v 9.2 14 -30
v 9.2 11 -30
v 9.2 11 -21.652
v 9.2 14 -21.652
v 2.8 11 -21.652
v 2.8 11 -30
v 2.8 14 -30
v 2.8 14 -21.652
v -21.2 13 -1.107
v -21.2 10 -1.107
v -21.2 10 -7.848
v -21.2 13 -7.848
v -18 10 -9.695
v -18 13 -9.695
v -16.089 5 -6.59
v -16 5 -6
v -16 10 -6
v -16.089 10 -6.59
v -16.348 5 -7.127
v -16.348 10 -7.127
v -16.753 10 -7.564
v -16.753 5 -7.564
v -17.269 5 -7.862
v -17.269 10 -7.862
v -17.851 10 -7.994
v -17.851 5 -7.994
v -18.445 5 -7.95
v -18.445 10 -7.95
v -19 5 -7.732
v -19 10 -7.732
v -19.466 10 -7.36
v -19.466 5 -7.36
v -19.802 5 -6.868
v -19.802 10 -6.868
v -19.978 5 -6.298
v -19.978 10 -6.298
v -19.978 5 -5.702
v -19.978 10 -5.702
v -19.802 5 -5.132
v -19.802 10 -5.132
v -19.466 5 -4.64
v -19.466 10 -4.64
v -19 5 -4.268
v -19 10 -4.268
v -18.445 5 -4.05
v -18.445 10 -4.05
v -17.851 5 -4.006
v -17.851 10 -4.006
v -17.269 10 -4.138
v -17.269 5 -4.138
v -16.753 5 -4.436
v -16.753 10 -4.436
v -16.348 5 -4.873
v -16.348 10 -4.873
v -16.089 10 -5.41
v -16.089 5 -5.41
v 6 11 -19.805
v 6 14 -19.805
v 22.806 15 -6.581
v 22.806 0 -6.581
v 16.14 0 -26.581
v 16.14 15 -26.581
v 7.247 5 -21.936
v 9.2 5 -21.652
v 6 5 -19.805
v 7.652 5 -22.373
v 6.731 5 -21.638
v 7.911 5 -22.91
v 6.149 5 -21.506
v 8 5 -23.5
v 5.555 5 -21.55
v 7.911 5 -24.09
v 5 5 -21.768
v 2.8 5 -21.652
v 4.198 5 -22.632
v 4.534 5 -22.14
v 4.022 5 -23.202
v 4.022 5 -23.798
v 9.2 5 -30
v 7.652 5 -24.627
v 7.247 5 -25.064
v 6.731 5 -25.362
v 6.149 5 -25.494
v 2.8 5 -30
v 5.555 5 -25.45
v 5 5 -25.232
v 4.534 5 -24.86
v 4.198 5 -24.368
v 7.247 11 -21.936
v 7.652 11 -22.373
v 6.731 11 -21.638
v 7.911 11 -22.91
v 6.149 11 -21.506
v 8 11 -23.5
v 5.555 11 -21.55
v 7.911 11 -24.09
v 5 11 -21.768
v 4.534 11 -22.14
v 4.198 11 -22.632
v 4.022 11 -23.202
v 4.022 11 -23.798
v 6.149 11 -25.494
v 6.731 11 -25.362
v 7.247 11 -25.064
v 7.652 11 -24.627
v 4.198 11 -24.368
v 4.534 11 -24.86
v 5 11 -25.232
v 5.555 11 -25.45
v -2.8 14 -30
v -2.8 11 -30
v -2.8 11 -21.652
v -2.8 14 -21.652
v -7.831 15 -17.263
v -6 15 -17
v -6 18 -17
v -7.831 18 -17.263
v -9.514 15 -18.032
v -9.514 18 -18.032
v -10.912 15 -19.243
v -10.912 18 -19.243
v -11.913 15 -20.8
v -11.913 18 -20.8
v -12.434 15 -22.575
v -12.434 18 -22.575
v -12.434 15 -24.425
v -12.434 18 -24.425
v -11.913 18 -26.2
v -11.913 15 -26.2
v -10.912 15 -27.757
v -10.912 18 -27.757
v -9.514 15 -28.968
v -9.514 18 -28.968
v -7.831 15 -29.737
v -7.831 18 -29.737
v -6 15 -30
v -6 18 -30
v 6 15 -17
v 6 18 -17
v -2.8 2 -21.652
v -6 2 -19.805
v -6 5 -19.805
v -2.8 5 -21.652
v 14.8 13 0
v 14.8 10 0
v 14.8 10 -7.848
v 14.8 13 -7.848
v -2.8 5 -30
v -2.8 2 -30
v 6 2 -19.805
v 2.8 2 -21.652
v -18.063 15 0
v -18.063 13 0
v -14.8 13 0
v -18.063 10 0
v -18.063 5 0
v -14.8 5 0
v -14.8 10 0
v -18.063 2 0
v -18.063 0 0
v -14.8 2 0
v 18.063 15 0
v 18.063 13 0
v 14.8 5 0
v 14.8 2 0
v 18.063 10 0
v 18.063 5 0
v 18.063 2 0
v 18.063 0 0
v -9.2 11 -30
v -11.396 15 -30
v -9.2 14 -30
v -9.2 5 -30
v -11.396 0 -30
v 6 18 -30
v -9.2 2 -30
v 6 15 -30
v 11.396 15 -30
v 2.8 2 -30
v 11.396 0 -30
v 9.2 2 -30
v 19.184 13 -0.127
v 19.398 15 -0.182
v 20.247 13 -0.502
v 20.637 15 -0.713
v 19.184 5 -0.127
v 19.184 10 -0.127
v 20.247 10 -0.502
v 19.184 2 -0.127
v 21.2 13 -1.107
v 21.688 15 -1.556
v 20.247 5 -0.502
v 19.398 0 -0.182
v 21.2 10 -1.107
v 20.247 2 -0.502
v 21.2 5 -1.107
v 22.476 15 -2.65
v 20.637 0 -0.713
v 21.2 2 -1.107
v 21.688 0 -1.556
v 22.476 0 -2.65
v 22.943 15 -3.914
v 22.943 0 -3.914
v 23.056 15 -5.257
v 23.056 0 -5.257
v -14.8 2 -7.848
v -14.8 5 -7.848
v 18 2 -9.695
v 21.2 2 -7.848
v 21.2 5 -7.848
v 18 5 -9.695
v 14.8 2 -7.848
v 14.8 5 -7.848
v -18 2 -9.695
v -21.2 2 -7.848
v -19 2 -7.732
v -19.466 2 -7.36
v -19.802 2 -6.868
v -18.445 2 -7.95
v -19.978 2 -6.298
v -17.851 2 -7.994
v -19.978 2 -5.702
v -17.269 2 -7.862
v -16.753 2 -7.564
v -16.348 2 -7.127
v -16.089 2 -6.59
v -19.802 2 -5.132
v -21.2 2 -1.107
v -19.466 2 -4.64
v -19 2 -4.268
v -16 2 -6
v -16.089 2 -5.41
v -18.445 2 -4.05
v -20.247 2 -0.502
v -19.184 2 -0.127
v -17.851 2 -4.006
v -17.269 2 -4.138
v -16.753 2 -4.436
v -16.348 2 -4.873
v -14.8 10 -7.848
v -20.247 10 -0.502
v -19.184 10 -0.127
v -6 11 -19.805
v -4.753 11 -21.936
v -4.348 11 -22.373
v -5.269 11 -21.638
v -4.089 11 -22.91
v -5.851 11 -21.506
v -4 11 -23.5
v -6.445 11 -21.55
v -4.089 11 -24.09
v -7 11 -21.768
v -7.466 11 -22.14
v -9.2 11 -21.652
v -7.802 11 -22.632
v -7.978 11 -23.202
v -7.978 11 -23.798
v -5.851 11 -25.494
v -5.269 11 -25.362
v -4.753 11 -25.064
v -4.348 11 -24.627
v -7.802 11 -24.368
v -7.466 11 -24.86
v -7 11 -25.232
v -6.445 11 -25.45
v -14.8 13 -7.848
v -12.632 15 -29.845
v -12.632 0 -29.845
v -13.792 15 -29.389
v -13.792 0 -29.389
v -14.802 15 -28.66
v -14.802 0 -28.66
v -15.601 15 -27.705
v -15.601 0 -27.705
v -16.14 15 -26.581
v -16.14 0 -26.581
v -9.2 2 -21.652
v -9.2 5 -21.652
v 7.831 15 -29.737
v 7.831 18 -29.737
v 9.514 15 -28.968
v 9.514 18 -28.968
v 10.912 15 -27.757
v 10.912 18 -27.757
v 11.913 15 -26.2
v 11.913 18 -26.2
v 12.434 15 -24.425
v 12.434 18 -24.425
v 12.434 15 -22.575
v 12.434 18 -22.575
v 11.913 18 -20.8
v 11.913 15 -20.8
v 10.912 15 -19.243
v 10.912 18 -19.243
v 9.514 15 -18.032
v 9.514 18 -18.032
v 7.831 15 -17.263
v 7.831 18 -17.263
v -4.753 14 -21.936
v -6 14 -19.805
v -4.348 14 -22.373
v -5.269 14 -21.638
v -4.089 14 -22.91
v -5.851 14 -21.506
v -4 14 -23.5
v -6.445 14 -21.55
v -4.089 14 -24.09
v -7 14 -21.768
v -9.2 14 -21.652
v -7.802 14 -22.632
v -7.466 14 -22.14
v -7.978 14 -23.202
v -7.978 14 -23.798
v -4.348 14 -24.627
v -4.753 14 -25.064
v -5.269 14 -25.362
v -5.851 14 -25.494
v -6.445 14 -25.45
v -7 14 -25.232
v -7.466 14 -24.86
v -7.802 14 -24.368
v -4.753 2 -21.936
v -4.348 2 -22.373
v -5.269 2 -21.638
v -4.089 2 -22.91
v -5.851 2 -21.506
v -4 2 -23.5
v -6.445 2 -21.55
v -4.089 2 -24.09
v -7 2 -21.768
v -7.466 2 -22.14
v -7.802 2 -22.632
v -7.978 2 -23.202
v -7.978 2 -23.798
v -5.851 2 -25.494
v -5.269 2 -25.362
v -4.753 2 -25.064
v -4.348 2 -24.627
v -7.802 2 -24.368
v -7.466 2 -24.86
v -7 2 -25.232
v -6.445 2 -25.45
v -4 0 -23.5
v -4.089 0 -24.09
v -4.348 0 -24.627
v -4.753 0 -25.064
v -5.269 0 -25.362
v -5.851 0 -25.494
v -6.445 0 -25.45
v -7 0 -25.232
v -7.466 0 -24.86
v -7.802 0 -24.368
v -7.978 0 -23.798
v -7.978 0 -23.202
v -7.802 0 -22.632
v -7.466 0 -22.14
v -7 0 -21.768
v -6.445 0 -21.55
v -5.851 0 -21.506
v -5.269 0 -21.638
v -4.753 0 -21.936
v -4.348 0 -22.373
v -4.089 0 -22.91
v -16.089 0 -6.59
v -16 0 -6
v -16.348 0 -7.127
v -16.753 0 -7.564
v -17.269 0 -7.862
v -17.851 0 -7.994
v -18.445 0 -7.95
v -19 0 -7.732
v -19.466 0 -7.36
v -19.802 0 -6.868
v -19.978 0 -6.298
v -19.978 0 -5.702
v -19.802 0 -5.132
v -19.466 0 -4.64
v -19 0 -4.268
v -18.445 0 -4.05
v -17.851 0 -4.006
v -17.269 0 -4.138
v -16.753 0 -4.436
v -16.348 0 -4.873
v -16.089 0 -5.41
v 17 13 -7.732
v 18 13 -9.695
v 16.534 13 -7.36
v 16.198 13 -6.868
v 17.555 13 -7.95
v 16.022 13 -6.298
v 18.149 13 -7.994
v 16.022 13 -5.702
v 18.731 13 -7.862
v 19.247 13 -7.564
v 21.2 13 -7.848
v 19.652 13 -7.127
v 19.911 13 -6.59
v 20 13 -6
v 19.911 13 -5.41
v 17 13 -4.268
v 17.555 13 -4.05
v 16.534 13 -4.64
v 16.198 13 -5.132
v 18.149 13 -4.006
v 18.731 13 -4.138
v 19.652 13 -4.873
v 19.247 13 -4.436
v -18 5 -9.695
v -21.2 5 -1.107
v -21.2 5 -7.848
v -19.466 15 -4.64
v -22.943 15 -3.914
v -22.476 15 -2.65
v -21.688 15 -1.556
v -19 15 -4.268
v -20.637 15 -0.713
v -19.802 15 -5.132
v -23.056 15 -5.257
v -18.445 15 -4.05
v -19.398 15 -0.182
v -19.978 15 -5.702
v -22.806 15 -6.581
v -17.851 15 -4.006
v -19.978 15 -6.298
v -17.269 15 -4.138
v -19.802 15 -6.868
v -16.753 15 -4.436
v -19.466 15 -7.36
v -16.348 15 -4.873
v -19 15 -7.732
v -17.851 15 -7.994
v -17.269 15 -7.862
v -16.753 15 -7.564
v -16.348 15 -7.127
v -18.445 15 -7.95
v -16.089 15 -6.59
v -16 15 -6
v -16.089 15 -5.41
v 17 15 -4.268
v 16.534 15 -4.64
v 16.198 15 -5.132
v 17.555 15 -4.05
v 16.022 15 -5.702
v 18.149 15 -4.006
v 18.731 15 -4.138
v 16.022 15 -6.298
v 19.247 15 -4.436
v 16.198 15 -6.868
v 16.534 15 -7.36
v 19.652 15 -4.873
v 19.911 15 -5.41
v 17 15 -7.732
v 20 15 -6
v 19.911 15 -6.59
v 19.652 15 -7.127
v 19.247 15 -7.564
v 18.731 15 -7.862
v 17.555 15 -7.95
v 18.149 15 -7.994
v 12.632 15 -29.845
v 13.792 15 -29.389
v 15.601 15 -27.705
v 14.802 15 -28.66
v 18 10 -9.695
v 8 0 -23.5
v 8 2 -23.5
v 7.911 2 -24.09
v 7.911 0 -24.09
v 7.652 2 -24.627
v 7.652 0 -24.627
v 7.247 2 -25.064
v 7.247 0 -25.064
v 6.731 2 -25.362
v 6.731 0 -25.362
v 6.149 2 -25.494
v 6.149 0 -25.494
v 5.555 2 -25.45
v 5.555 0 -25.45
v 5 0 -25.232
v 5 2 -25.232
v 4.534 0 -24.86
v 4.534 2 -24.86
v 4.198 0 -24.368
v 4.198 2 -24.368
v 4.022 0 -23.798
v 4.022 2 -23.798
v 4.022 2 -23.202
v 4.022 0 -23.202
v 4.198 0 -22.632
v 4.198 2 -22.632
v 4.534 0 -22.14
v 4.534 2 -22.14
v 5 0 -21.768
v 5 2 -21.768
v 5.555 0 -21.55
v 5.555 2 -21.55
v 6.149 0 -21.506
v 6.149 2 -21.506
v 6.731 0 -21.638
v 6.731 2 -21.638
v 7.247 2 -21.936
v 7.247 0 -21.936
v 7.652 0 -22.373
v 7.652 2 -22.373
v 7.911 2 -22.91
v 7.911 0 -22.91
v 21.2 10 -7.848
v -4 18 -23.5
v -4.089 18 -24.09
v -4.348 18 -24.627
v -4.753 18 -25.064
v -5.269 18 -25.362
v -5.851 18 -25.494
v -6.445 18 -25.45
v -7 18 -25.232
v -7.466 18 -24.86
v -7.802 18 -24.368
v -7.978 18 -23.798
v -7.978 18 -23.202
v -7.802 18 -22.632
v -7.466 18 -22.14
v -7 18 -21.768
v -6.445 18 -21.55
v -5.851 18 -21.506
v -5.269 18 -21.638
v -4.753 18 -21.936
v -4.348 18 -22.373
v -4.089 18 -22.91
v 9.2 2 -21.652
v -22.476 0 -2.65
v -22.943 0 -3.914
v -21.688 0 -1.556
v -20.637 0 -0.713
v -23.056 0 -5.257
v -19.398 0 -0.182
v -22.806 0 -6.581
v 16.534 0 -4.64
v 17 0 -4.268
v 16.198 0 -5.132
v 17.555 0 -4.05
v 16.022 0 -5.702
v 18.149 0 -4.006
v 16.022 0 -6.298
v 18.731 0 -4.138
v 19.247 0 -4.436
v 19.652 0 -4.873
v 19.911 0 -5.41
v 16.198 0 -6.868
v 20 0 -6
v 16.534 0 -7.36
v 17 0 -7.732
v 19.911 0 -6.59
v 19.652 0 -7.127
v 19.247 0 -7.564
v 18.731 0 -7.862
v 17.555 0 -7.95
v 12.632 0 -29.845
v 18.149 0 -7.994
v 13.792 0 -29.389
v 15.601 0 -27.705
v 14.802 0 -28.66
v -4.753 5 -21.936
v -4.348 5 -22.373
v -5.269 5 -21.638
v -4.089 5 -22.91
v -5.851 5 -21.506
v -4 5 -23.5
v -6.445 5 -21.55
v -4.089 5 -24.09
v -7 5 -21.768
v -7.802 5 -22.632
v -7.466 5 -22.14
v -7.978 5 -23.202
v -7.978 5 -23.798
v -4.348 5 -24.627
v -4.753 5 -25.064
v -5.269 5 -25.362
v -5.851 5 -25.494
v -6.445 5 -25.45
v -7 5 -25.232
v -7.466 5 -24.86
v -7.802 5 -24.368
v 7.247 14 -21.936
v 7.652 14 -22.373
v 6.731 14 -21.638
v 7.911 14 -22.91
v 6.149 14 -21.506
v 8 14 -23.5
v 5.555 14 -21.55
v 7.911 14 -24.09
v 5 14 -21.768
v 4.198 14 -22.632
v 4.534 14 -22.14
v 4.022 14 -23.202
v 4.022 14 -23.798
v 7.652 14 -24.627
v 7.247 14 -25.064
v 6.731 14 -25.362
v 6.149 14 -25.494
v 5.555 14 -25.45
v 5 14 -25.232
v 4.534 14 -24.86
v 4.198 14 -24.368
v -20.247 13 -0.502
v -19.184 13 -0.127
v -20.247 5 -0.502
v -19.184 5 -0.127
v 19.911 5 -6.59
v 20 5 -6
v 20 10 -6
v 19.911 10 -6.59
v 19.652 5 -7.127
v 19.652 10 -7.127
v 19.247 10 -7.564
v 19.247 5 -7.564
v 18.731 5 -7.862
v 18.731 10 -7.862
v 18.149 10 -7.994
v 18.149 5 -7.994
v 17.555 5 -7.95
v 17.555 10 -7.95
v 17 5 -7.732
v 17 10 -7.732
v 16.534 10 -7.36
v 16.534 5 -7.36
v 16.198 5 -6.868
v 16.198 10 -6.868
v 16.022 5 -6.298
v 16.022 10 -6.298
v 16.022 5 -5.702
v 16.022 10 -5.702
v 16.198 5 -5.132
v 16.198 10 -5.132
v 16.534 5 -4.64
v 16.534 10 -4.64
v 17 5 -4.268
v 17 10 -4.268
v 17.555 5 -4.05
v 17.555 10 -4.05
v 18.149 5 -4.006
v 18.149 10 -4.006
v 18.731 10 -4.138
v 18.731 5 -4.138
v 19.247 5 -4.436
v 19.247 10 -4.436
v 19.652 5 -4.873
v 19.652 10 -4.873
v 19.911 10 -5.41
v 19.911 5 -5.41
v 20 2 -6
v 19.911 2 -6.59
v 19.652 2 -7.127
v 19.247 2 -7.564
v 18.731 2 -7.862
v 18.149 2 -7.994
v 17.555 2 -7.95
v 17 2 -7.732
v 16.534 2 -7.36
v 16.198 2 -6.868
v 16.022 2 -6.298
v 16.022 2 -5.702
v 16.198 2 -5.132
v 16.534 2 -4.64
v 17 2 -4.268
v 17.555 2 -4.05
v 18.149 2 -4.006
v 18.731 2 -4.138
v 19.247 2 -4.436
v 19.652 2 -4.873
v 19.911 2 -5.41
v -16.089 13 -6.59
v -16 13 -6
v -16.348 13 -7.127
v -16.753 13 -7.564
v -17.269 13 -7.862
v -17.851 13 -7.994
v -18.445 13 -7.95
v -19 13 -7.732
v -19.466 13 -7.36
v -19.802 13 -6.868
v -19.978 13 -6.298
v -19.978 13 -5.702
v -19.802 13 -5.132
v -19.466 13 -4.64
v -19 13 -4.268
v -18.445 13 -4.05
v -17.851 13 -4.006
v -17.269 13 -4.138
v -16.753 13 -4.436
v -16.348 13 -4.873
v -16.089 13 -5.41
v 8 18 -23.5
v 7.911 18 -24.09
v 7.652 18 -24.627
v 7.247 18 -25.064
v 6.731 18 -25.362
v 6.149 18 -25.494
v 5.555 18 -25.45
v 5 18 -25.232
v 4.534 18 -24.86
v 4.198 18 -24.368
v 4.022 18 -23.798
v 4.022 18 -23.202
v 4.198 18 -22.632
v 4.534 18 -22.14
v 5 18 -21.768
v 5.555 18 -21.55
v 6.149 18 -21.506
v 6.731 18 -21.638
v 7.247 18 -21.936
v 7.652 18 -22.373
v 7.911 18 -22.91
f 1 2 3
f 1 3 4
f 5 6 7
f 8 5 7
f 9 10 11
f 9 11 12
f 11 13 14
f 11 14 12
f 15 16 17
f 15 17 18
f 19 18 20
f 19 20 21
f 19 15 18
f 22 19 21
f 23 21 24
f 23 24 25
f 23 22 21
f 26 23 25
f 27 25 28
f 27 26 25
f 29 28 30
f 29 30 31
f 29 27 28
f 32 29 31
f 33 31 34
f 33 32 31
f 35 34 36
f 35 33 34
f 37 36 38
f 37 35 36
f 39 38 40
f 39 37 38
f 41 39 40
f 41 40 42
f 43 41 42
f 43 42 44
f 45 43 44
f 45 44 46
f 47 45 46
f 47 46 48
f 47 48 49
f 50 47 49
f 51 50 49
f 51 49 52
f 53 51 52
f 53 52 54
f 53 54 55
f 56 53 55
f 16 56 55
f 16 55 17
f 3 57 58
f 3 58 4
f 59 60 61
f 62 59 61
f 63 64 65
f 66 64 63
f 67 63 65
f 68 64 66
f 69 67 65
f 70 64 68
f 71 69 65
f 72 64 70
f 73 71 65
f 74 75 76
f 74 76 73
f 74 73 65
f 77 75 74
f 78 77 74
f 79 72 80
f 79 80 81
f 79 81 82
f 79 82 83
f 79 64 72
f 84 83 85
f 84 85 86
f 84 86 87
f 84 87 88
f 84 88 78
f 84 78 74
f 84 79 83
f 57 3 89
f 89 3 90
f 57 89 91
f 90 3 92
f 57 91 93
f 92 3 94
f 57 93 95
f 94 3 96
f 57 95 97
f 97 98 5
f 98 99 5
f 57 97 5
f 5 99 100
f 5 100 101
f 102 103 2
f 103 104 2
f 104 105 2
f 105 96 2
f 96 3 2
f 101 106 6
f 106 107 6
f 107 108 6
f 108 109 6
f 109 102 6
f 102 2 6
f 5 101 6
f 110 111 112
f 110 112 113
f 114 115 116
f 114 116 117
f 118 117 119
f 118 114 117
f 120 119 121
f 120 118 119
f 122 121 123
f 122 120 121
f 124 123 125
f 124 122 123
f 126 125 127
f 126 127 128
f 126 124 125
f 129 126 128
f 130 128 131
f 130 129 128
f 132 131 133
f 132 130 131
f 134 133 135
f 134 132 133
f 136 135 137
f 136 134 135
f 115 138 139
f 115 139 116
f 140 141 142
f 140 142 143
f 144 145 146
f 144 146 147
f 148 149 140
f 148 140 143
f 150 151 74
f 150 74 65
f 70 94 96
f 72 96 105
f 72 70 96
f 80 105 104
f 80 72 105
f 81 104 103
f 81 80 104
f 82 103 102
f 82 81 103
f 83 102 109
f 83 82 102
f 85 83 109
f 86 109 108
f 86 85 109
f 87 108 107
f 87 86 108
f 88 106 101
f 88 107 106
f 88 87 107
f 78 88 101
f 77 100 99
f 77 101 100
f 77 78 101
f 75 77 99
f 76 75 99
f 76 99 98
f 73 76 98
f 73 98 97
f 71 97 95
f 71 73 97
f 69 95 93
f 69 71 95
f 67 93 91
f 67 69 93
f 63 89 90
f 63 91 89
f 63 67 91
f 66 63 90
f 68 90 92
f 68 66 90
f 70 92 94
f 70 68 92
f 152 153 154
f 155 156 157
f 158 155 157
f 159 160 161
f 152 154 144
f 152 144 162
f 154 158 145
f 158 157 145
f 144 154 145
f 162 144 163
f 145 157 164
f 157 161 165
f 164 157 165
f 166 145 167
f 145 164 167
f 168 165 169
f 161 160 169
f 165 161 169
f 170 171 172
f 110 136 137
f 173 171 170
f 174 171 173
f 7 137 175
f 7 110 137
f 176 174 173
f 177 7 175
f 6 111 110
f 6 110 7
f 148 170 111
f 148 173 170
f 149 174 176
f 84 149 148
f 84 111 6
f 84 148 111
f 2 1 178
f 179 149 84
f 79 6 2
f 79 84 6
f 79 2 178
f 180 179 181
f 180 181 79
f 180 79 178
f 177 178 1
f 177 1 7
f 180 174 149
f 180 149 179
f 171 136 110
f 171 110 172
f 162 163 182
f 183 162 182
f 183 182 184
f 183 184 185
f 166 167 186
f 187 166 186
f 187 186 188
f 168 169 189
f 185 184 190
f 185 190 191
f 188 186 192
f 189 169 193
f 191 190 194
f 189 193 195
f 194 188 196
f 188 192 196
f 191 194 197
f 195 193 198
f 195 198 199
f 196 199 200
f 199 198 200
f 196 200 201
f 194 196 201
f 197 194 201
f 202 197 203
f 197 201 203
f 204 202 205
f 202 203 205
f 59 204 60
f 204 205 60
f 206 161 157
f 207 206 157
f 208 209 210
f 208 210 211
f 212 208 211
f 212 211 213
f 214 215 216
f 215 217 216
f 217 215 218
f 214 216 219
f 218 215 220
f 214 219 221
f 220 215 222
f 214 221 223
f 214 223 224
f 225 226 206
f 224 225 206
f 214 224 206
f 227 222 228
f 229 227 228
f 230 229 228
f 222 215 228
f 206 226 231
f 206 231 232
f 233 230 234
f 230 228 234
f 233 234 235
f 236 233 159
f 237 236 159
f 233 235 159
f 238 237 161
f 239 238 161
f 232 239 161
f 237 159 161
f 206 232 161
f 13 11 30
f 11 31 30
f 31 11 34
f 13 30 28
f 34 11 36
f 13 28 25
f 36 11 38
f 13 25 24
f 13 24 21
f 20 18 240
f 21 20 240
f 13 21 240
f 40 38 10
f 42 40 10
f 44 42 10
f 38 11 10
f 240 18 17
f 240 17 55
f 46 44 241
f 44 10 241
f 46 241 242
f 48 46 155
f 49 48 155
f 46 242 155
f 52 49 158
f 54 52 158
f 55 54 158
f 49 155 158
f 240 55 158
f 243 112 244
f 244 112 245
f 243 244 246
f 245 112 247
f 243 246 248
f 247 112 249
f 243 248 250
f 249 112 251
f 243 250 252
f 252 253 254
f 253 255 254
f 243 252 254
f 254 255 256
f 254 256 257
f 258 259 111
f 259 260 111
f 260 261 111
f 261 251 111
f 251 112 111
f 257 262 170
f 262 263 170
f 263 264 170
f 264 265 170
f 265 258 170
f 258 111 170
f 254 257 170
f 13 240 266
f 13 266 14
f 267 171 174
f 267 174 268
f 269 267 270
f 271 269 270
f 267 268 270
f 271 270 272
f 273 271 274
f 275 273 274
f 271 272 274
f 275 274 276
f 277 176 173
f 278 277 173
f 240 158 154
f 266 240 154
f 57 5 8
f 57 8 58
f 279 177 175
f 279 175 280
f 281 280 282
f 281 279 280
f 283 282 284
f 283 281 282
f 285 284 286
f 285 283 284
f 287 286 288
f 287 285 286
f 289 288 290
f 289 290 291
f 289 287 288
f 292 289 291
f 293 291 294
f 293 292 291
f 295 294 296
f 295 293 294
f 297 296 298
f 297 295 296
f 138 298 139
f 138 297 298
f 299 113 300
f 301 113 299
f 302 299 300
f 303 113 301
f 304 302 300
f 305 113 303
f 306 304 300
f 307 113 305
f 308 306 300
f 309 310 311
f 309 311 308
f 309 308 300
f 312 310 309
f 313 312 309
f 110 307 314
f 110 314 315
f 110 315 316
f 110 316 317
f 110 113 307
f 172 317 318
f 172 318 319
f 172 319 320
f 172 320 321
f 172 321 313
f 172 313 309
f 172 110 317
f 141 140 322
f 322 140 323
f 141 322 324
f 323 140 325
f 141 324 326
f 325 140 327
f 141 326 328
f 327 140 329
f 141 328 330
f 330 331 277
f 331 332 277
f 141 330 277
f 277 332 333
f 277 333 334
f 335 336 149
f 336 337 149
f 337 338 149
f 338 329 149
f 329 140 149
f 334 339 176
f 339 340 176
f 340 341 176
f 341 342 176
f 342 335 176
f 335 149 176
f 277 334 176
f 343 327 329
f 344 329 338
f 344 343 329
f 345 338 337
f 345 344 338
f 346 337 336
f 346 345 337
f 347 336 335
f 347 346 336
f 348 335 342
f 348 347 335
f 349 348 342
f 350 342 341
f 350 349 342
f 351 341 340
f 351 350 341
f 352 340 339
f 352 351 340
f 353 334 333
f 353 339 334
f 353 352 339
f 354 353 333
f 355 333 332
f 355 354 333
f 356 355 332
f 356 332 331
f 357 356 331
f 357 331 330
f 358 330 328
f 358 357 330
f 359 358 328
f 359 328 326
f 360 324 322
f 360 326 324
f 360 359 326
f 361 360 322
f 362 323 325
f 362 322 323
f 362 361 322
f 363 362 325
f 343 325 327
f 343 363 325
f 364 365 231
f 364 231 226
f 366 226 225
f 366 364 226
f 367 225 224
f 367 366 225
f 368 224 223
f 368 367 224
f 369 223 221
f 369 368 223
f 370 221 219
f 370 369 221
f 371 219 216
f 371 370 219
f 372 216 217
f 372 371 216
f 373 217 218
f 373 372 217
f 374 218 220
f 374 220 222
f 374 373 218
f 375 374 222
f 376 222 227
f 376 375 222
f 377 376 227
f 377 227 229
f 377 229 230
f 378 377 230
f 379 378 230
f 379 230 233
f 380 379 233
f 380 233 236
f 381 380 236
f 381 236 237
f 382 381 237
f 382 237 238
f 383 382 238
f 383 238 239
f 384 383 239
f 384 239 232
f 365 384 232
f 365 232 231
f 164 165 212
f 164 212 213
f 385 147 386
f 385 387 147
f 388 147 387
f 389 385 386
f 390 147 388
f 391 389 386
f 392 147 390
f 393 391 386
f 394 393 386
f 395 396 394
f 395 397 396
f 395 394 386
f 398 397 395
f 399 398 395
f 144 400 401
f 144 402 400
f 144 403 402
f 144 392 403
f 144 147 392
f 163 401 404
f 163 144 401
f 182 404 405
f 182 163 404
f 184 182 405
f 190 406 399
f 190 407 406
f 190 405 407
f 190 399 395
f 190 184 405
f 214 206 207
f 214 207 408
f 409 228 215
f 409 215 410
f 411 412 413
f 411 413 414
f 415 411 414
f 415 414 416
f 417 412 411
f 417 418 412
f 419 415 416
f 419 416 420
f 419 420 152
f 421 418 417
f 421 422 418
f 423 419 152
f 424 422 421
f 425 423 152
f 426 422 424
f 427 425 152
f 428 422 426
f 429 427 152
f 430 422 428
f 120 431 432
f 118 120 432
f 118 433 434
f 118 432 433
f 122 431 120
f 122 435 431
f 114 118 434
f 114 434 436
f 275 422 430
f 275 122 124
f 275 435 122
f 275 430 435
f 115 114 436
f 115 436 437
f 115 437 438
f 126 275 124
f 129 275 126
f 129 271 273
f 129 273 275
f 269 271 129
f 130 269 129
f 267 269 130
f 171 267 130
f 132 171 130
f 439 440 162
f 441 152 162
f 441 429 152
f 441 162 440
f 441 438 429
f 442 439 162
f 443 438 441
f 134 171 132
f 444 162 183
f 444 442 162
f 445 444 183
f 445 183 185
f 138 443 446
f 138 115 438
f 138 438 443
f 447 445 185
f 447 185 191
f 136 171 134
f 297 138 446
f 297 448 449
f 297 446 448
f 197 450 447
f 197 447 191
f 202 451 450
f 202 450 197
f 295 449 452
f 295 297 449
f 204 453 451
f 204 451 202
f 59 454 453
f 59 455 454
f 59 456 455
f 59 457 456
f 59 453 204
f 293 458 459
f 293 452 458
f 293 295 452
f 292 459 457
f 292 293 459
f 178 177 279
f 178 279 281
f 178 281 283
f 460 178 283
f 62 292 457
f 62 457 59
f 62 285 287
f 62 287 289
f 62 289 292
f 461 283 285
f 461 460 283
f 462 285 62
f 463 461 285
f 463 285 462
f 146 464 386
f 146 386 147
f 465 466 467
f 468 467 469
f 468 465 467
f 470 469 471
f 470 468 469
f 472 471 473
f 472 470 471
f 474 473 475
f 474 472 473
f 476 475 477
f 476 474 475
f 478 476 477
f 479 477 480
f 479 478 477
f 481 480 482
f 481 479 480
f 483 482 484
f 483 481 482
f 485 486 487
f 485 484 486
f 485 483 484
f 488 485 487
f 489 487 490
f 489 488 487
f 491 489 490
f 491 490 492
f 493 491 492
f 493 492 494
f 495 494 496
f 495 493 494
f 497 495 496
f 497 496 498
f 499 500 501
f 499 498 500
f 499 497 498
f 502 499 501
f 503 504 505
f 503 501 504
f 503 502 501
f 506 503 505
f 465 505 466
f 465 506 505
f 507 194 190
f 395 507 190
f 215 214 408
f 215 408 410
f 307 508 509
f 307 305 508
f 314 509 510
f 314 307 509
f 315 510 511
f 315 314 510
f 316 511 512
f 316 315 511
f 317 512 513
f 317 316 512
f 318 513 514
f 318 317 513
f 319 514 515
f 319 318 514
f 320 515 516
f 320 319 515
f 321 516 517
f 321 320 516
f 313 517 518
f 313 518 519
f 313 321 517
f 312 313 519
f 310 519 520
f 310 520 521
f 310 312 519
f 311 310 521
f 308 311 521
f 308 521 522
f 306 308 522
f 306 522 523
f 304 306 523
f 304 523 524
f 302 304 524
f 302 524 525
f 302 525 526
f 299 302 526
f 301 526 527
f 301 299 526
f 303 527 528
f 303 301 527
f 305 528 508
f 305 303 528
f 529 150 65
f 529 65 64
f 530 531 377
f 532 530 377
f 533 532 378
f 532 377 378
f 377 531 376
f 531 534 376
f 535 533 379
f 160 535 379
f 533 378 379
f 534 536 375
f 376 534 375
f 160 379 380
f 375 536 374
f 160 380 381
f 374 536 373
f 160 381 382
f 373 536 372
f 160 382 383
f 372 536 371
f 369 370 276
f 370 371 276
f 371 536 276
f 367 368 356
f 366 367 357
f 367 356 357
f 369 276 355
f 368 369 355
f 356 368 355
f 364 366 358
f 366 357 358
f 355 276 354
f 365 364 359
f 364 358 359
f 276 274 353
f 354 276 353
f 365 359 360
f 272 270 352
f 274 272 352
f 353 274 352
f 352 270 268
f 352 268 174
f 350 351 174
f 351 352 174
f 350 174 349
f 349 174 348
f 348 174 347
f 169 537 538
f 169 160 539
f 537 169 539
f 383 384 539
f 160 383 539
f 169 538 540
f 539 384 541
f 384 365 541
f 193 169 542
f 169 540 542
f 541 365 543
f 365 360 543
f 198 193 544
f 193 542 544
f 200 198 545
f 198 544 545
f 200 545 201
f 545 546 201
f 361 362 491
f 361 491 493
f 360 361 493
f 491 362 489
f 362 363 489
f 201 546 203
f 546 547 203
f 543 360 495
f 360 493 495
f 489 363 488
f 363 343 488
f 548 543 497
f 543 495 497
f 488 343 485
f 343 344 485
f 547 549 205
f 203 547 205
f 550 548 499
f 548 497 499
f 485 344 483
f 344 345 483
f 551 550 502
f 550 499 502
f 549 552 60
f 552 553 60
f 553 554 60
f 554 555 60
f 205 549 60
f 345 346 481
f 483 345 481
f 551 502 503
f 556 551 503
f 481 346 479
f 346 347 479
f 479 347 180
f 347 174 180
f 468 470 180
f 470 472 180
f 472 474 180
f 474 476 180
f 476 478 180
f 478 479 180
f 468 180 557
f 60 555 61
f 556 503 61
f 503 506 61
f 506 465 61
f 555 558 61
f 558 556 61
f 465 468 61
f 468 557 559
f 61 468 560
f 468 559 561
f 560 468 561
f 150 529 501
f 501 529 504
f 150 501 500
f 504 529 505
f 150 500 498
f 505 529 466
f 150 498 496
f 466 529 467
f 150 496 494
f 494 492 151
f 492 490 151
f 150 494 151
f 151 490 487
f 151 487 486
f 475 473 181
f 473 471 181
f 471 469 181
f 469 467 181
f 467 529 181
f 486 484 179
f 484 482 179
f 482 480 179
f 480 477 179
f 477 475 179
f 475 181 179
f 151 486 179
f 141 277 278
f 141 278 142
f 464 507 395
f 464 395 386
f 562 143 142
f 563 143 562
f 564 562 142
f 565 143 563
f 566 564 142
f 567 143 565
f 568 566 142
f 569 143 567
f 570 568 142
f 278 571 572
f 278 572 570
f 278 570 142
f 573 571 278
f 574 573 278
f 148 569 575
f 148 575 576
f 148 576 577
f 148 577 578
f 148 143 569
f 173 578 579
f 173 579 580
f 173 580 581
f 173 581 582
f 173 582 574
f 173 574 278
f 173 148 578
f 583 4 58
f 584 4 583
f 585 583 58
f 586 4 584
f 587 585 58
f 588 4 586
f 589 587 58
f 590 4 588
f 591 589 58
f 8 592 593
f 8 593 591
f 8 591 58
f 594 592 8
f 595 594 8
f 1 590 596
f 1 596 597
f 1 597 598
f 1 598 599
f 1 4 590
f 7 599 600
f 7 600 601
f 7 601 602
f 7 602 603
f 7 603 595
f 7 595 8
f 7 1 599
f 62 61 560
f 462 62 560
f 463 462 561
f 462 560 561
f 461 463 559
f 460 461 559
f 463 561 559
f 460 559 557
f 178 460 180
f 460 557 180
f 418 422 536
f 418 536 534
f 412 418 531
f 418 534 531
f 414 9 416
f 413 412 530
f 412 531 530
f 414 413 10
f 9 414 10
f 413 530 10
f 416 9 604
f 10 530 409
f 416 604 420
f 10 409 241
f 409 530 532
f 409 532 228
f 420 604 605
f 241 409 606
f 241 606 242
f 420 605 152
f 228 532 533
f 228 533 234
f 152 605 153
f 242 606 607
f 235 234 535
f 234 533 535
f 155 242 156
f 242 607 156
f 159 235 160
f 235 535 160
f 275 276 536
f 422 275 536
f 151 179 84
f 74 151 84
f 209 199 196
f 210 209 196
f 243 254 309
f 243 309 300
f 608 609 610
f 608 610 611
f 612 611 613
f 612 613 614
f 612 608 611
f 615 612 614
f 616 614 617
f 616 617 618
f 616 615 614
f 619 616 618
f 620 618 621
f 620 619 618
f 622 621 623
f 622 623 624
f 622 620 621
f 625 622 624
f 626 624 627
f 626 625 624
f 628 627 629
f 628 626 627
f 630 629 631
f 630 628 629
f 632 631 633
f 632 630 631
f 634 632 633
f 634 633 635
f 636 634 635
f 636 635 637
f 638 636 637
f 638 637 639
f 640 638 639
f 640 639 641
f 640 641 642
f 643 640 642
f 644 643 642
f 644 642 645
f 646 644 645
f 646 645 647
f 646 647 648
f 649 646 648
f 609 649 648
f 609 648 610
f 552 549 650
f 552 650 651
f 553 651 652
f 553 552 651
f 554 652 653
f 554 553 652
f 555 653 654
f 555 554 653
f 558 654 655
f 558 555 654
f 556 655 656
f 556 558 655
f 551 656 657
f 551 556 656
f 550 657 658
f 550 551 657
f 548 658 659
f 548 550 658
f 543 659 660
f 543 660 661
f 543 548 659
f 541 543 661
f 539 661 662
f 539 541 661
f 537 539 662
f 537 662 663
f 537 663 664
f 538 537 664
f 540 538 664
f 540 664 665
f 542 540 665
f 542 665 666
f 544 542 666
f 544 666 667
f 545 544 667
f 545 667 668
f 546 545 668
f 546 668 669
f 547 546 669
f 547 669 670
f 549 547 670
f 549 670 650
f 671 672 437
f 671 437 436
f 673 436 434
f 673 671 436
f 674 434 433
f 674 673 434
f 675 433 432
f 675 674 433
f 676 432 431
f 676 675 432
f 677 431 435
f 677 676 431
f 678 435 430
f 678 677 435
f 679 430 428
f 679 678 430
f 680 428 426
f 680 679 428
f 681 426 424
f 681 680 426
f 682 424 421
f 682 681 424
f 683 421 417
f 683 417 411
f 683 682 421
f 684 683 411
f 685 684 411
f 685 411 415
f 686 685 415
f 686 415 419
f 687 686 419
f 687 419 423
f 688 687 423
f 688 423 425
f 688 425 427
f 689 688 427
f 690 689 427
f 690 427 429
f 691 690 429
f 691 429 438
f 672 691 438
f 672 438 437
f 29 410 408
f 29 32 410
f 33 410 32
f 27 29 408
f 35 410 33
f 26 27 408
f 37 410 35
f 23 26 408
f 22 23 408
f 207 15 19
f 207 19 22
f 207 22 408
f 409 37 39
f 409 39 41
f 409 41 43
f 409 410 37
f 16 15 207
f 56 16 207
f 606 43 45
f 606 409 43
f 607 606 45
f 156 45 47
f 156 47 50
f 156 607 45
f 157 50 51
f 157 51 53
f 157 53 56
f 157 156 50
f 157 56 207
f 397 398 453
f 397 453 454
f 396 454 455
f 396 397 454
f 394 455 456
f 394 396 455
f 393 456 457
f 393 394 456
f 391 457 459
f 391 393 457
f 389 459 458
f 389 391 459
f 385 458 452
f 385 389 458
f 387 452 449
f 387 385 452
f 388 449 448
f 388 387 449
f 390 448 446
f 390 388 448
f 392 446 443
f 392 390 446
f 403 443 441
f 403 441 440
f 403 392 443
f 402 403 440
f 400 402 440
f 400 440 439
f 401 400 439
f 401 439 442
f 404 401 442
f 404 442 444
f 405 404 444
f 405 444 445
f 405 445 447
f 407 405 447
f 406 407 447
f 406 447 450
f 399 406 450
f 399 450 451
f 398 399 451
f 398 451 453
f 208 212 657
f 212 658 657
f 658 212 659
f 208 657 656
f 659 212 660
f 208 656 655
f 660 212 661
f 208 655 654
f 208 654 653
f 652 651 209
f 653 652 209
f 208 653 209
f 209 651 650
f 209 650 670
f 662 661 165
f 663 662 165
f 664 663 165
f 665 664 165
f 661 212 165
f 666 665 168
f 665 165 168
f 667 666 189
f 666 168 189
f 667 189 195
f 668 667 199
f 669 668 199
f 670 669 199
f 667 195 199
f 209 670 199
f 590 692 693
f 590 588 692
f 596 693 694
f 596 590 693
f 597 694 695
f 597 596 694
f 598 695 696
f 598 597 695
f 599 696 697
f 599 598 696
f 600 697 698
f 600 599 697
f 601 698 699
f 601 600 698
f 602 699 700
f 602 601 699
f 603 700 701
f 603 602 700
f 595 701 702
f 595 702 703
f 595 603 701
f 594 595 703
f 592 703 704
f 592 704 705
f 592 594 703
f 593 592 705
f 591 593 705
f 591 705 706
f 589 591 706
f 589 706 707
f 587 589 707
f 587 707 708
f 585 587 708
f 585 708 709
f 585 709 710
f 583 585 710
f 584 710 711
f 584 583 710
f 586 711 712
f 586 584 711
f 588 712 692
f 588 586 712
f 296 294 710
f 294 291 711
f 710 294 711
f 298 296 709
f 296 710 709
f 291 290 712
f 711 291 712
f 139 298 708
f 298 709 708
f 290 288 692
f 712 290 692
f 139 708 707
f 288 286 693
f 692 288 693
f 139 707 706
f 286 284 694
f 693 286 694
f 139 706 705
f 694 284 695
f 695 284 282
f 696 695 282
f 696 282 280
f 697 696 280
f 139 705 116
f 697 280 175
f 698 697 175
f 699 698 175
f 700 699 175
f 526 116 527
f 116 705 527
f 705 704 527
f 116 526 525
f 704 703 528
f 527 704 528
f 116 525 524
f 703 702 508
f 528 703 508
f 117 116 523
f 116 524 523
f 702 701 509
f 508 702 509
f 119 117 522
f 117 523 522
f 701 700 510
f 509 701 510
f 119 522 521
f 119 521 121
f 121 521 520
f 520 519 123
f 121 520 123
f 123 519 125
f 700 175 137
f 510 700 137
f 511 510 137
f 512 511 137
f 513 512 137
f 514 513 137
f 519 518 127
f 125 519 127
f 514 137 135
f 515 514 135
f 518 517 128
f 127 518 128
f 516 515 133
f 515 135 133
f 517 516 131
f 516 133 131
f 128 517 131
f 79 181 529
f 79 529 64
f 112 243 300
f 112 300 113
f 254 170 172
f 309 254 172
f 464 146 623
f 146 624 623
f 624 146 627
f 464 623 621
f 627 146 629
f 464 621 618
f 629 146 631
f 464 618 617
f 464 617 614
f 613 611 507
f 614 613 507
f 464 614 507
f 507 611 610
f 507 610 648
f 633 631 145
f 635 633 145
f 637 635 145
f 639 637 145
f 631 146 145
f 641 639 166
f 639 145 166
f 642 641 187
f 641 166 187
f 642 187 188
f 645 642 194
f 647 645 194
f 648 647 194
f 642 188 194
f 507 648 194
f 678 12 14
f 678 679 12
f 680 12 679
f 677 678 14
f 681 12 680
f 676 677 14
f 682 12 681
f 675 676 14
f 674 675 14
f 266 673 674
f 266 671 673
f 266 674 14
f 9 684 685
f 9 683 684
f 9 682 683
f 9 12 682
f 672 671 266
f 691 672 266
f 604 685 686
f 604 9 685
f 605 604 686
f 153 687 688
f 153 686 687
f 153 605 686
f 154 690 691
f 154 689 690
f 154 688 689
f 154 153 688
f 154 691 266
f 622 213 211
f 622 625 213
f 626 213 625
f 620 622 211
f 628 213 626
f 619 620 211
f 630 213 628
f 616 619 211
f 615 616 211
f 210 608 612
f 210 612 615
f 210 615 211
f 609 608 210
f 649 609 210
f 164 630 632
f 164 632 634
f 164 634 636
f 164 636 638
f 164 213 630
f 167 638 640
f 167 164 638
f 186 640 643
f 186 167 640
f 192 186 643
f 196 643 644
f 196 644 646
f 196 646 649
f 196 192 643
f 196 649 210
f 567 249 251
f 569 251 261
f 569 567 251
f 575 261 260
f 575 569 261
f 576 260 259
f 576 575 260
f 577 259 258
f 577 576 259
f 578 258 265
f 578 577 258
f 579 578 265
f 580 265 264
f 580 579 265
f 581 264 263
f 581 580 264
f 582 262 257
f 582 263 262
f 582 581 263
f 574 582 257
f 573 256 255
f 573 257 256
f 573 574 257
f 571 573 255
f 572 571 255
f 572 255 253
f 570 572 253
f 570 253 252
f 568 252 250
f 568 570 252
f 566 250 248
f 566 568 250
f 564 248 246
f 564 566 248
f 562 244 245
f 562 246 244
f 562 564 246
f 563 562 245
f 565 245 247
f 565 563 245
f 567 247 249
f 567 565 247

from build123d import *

# Parameters (mm, degrees)
SKETCH1_R           = 2
BOSS_EXTRUDE1_DEPTH = 15
SKETCH2_R           = 2
BOSS_EXTRUDE2_DEPTH = 3
SKETCH5_W           = 6.4
SKETCH5_H           = 3
CUT_EXTRUDE1_DEPTH  = 6.4
CUT_EXTRUDE2_DEPTH  = 3
CUT_EXTRUDE3_DEPTH  = 3
SKETCH8_W           = 6.4
SKETCH8_H           = 3
CUT_EXTRUDE4_DEPTH  = 6
CUT_EXTRUDE5_DEPTH  = 3
CUT_EXTRUDE6_DEPTH  = 3


with BuildPart() as part:
    # Sketch1 → Boss-Extrude1 (new body)
    with BuildSketch(Plane(origin=(0, 0, 0), x_dir=(1, 0, 0), z_dir=(0, 1, 0))):
        with BuildLine():
            Line((-18.062870566, 0), (18.062870566, 0))
            ThreePointArc((18.062870566, 0), (22.119081492, 2.076448577), (22.806287057, 6.58113883))
            Line((22.806287057, 6.58113883), (16.13962039, 26.58113883))
            ThreePointArc((16.13962039, 26.58113883), (14.319755323, 29.056210926), (11.3962039, 30))
            Line((11.3962039, 30), (-11.3962039, 30))
            ThreePointArc((-11.3962039, 30), (-14.319755323, 29.056210926), (-16.13962039, 26.58113883))
            Line((-16.13962039, 26.58113883), (-22.806287057, 6.58113883))
            ThreePointArc((-22.806287057, 6.58113883), (-22.119081492, 2.076448577), (-18.062870566, 0))
        make_face()
        with Locations((-18, 6)):
            Circle(SKETCH1_R, mode=Mode.SUBTRACT)
        with Locations((18, 6)):
            Circle(SKETCH1_R, mode=Mode.SUBTRACT)
        with Locations((6, 23.5)):
            Circle(SKETCH1_R, mode=Mode.SUBTRACT)
        with Locations((-6, 23.5)):
            Circle(SKETCH1_R, mode=Mode.SUBTRACT)
    extrude(amount=BOSS_EXTRUDE1_DEPTH)

    # Sketch2 → Boss-Extrude2 (add)
    with BuildSketch(Plane(origin=(0, 15, 0), x_dir=(1, 0, 0), z_dir=(0, 1, 0))):
        with BuildLine():
            Line((-6, 30), (6, 30))
            ThreePointArc((6, 30), (12.5, 23.5), (6, 17))
            Line((6, 17), (-6, 17))
            ThreePointArc((-6, 17), (-12.5, 23.5), (-6, 30))
        make_face()
        with Locations((-6, 23.5)):
            Circle(SKETCH2_R, mode=Mode.SUBTRACT)
        with Locations((6, 23.5)):
            Circle(SKETCH2_R, mode=Mode.SUBTRACT)
    extrude(amount=BOSS_EXTRUDE2_DEPTH)

    # Sketch5 → Cut-Extrude1 (cut)
    with BuildSketch(Plane(origin=(0, 0, -30), x_dir=(-1, 0, 0), z_dir=(0, 0, -1))):
        with Locations((6, 12.5)):
            Rectangle(SKETCH5_W, SKETCH5_H)
        with Locations((-6, 12.5)):
            Rectangle(SKETCH5_W, SKETCH5_H)
        with Locations((-6, 3.5)):
            Rectangle(SKETCH5_W, SKETCH5_H)
        with Locations((6, 3.5)):
            Rectangle(SKETCH5_W, SKETCH5_H)
    extrude(amount=-CUT_EXTRUDE1_DEPTH, mode=Mode.SUBTRACT)

    # Sketch6 → Cut-Extrude2 (cut)
    with BuildSketch(Plane(origin=(0, 11, 0), x_dir=(1, 0, 0), z_dir=(0, 1, 0))):
        Polygon((9.2, 25.347520861), (6, 27.195041723), (2.8, 25.347520861), (2.8, 21.652479139), (6, 19.804958277), (9.2, 21.652479139), align=None)
        Polygon((-2.8, 25.347520861), (-6, 27.195041723), (-9.2, 25.347520861), (-9.2, 21.652479139), (-6, 19.804958277), (-2.8, 21.652479139), align=None)
    extrude(amount=CUT_EXTRUDE2_DEPTH, mode=Mode.SUBTRACT)

    # Sketch7 → Cut-Extrude3 (cut)
    with BuildSketch(Plane(origin=(0, 2, 0), x_dir=(1, 0, 0), z_dir=(0, 1, 0))):
        Polygon((9.2, 25.347520861), (6, 27.195041723), (2.8, 25.347520861), (2.8, 21.652479139), (6, 19.804958277), (9.2, 21.652479139), align=None)
        Polygon((-6, 19.804958277), (-2.8, 21.652479139), (-2.8, 25.347520861), (-6, 27.195041723), (-9.2, 25.347520861), (-9.2, 21.652479139), align=None)
    extrude(amount=CUT_EXTRUDE3_DEPTH, mode=Mode.SUBTRACT)

    # Sketch8 → Cut-Extrude4 (cut)
    with BuildSketch(Plane.XY):
        with Locations((18, 11.5)):
            Rectangle(SKETCH8_W, SKETCH8_H)
        with Locations((-18, 11.5)):
            Rectangle(SKETCH8_W, SKETCH8_H)
        with Locations((-18, 3.5)):
            Rectangle(SKETCH8_W, SKETCH8_H)
        with Locations((18, 3.5)):
            Rectangle(SKETCH8_W, SKETCH8_H)
    extrude(amount=-CUT_EXTRUDE4_DEPTH, mode=Mode.SUBTRACT)

    # Sketch9 → Cut-Extrude5 (cut)
    with BuildSketch(Plane(origin=(0, 10, 0), x_dir=(1, 0, 0), z_dir=(0, 1, 0))):
        Polygon((21.2, 4.152479139), (21.2, 7.847520861), (18, 9.695041723), (14.8, 7.847520861), (14.8, 4.152479139), (18, 2.304958277), align=None)
        Polygon((-14.8, 4.152479139), (-14.8, 7.847520861), (-18, 9.695041723), (-21.2, 7.847520861), (-21.2, 4.152479139), (-18, 2.304958277), align=None)
    extrude(amount=CUT_EXTRUDE5_DEPTH, mode=Mode.SUBTRACT)

    # Sketch10 → Cut-Extrude6 (cut)
    with BuildSketch(Plane(origin=(0, 2, 0), x_dir=(1, 0, 0), z_dir=(0, 1, 0))):
        Polygon((21.2, 4.152479139), (21.2, 7.847520861), (18, 9.695041723), (14.8, 7.847520861), (14.8, 4.152479139), (18, 2.304958277), align=None)
        Polygon((-21.2, 4.152479139), (-18, 2.304958277), (-14.8, 4.152479139), (-14.8, 7.847520861), (-18, 9.695041723), (-21.2, 7.847520861), align=None)
    extrude(amount=CUT_EXTRUDE6_DEPTH, mode=Mode.SUBTRACT)


solid = part.part
